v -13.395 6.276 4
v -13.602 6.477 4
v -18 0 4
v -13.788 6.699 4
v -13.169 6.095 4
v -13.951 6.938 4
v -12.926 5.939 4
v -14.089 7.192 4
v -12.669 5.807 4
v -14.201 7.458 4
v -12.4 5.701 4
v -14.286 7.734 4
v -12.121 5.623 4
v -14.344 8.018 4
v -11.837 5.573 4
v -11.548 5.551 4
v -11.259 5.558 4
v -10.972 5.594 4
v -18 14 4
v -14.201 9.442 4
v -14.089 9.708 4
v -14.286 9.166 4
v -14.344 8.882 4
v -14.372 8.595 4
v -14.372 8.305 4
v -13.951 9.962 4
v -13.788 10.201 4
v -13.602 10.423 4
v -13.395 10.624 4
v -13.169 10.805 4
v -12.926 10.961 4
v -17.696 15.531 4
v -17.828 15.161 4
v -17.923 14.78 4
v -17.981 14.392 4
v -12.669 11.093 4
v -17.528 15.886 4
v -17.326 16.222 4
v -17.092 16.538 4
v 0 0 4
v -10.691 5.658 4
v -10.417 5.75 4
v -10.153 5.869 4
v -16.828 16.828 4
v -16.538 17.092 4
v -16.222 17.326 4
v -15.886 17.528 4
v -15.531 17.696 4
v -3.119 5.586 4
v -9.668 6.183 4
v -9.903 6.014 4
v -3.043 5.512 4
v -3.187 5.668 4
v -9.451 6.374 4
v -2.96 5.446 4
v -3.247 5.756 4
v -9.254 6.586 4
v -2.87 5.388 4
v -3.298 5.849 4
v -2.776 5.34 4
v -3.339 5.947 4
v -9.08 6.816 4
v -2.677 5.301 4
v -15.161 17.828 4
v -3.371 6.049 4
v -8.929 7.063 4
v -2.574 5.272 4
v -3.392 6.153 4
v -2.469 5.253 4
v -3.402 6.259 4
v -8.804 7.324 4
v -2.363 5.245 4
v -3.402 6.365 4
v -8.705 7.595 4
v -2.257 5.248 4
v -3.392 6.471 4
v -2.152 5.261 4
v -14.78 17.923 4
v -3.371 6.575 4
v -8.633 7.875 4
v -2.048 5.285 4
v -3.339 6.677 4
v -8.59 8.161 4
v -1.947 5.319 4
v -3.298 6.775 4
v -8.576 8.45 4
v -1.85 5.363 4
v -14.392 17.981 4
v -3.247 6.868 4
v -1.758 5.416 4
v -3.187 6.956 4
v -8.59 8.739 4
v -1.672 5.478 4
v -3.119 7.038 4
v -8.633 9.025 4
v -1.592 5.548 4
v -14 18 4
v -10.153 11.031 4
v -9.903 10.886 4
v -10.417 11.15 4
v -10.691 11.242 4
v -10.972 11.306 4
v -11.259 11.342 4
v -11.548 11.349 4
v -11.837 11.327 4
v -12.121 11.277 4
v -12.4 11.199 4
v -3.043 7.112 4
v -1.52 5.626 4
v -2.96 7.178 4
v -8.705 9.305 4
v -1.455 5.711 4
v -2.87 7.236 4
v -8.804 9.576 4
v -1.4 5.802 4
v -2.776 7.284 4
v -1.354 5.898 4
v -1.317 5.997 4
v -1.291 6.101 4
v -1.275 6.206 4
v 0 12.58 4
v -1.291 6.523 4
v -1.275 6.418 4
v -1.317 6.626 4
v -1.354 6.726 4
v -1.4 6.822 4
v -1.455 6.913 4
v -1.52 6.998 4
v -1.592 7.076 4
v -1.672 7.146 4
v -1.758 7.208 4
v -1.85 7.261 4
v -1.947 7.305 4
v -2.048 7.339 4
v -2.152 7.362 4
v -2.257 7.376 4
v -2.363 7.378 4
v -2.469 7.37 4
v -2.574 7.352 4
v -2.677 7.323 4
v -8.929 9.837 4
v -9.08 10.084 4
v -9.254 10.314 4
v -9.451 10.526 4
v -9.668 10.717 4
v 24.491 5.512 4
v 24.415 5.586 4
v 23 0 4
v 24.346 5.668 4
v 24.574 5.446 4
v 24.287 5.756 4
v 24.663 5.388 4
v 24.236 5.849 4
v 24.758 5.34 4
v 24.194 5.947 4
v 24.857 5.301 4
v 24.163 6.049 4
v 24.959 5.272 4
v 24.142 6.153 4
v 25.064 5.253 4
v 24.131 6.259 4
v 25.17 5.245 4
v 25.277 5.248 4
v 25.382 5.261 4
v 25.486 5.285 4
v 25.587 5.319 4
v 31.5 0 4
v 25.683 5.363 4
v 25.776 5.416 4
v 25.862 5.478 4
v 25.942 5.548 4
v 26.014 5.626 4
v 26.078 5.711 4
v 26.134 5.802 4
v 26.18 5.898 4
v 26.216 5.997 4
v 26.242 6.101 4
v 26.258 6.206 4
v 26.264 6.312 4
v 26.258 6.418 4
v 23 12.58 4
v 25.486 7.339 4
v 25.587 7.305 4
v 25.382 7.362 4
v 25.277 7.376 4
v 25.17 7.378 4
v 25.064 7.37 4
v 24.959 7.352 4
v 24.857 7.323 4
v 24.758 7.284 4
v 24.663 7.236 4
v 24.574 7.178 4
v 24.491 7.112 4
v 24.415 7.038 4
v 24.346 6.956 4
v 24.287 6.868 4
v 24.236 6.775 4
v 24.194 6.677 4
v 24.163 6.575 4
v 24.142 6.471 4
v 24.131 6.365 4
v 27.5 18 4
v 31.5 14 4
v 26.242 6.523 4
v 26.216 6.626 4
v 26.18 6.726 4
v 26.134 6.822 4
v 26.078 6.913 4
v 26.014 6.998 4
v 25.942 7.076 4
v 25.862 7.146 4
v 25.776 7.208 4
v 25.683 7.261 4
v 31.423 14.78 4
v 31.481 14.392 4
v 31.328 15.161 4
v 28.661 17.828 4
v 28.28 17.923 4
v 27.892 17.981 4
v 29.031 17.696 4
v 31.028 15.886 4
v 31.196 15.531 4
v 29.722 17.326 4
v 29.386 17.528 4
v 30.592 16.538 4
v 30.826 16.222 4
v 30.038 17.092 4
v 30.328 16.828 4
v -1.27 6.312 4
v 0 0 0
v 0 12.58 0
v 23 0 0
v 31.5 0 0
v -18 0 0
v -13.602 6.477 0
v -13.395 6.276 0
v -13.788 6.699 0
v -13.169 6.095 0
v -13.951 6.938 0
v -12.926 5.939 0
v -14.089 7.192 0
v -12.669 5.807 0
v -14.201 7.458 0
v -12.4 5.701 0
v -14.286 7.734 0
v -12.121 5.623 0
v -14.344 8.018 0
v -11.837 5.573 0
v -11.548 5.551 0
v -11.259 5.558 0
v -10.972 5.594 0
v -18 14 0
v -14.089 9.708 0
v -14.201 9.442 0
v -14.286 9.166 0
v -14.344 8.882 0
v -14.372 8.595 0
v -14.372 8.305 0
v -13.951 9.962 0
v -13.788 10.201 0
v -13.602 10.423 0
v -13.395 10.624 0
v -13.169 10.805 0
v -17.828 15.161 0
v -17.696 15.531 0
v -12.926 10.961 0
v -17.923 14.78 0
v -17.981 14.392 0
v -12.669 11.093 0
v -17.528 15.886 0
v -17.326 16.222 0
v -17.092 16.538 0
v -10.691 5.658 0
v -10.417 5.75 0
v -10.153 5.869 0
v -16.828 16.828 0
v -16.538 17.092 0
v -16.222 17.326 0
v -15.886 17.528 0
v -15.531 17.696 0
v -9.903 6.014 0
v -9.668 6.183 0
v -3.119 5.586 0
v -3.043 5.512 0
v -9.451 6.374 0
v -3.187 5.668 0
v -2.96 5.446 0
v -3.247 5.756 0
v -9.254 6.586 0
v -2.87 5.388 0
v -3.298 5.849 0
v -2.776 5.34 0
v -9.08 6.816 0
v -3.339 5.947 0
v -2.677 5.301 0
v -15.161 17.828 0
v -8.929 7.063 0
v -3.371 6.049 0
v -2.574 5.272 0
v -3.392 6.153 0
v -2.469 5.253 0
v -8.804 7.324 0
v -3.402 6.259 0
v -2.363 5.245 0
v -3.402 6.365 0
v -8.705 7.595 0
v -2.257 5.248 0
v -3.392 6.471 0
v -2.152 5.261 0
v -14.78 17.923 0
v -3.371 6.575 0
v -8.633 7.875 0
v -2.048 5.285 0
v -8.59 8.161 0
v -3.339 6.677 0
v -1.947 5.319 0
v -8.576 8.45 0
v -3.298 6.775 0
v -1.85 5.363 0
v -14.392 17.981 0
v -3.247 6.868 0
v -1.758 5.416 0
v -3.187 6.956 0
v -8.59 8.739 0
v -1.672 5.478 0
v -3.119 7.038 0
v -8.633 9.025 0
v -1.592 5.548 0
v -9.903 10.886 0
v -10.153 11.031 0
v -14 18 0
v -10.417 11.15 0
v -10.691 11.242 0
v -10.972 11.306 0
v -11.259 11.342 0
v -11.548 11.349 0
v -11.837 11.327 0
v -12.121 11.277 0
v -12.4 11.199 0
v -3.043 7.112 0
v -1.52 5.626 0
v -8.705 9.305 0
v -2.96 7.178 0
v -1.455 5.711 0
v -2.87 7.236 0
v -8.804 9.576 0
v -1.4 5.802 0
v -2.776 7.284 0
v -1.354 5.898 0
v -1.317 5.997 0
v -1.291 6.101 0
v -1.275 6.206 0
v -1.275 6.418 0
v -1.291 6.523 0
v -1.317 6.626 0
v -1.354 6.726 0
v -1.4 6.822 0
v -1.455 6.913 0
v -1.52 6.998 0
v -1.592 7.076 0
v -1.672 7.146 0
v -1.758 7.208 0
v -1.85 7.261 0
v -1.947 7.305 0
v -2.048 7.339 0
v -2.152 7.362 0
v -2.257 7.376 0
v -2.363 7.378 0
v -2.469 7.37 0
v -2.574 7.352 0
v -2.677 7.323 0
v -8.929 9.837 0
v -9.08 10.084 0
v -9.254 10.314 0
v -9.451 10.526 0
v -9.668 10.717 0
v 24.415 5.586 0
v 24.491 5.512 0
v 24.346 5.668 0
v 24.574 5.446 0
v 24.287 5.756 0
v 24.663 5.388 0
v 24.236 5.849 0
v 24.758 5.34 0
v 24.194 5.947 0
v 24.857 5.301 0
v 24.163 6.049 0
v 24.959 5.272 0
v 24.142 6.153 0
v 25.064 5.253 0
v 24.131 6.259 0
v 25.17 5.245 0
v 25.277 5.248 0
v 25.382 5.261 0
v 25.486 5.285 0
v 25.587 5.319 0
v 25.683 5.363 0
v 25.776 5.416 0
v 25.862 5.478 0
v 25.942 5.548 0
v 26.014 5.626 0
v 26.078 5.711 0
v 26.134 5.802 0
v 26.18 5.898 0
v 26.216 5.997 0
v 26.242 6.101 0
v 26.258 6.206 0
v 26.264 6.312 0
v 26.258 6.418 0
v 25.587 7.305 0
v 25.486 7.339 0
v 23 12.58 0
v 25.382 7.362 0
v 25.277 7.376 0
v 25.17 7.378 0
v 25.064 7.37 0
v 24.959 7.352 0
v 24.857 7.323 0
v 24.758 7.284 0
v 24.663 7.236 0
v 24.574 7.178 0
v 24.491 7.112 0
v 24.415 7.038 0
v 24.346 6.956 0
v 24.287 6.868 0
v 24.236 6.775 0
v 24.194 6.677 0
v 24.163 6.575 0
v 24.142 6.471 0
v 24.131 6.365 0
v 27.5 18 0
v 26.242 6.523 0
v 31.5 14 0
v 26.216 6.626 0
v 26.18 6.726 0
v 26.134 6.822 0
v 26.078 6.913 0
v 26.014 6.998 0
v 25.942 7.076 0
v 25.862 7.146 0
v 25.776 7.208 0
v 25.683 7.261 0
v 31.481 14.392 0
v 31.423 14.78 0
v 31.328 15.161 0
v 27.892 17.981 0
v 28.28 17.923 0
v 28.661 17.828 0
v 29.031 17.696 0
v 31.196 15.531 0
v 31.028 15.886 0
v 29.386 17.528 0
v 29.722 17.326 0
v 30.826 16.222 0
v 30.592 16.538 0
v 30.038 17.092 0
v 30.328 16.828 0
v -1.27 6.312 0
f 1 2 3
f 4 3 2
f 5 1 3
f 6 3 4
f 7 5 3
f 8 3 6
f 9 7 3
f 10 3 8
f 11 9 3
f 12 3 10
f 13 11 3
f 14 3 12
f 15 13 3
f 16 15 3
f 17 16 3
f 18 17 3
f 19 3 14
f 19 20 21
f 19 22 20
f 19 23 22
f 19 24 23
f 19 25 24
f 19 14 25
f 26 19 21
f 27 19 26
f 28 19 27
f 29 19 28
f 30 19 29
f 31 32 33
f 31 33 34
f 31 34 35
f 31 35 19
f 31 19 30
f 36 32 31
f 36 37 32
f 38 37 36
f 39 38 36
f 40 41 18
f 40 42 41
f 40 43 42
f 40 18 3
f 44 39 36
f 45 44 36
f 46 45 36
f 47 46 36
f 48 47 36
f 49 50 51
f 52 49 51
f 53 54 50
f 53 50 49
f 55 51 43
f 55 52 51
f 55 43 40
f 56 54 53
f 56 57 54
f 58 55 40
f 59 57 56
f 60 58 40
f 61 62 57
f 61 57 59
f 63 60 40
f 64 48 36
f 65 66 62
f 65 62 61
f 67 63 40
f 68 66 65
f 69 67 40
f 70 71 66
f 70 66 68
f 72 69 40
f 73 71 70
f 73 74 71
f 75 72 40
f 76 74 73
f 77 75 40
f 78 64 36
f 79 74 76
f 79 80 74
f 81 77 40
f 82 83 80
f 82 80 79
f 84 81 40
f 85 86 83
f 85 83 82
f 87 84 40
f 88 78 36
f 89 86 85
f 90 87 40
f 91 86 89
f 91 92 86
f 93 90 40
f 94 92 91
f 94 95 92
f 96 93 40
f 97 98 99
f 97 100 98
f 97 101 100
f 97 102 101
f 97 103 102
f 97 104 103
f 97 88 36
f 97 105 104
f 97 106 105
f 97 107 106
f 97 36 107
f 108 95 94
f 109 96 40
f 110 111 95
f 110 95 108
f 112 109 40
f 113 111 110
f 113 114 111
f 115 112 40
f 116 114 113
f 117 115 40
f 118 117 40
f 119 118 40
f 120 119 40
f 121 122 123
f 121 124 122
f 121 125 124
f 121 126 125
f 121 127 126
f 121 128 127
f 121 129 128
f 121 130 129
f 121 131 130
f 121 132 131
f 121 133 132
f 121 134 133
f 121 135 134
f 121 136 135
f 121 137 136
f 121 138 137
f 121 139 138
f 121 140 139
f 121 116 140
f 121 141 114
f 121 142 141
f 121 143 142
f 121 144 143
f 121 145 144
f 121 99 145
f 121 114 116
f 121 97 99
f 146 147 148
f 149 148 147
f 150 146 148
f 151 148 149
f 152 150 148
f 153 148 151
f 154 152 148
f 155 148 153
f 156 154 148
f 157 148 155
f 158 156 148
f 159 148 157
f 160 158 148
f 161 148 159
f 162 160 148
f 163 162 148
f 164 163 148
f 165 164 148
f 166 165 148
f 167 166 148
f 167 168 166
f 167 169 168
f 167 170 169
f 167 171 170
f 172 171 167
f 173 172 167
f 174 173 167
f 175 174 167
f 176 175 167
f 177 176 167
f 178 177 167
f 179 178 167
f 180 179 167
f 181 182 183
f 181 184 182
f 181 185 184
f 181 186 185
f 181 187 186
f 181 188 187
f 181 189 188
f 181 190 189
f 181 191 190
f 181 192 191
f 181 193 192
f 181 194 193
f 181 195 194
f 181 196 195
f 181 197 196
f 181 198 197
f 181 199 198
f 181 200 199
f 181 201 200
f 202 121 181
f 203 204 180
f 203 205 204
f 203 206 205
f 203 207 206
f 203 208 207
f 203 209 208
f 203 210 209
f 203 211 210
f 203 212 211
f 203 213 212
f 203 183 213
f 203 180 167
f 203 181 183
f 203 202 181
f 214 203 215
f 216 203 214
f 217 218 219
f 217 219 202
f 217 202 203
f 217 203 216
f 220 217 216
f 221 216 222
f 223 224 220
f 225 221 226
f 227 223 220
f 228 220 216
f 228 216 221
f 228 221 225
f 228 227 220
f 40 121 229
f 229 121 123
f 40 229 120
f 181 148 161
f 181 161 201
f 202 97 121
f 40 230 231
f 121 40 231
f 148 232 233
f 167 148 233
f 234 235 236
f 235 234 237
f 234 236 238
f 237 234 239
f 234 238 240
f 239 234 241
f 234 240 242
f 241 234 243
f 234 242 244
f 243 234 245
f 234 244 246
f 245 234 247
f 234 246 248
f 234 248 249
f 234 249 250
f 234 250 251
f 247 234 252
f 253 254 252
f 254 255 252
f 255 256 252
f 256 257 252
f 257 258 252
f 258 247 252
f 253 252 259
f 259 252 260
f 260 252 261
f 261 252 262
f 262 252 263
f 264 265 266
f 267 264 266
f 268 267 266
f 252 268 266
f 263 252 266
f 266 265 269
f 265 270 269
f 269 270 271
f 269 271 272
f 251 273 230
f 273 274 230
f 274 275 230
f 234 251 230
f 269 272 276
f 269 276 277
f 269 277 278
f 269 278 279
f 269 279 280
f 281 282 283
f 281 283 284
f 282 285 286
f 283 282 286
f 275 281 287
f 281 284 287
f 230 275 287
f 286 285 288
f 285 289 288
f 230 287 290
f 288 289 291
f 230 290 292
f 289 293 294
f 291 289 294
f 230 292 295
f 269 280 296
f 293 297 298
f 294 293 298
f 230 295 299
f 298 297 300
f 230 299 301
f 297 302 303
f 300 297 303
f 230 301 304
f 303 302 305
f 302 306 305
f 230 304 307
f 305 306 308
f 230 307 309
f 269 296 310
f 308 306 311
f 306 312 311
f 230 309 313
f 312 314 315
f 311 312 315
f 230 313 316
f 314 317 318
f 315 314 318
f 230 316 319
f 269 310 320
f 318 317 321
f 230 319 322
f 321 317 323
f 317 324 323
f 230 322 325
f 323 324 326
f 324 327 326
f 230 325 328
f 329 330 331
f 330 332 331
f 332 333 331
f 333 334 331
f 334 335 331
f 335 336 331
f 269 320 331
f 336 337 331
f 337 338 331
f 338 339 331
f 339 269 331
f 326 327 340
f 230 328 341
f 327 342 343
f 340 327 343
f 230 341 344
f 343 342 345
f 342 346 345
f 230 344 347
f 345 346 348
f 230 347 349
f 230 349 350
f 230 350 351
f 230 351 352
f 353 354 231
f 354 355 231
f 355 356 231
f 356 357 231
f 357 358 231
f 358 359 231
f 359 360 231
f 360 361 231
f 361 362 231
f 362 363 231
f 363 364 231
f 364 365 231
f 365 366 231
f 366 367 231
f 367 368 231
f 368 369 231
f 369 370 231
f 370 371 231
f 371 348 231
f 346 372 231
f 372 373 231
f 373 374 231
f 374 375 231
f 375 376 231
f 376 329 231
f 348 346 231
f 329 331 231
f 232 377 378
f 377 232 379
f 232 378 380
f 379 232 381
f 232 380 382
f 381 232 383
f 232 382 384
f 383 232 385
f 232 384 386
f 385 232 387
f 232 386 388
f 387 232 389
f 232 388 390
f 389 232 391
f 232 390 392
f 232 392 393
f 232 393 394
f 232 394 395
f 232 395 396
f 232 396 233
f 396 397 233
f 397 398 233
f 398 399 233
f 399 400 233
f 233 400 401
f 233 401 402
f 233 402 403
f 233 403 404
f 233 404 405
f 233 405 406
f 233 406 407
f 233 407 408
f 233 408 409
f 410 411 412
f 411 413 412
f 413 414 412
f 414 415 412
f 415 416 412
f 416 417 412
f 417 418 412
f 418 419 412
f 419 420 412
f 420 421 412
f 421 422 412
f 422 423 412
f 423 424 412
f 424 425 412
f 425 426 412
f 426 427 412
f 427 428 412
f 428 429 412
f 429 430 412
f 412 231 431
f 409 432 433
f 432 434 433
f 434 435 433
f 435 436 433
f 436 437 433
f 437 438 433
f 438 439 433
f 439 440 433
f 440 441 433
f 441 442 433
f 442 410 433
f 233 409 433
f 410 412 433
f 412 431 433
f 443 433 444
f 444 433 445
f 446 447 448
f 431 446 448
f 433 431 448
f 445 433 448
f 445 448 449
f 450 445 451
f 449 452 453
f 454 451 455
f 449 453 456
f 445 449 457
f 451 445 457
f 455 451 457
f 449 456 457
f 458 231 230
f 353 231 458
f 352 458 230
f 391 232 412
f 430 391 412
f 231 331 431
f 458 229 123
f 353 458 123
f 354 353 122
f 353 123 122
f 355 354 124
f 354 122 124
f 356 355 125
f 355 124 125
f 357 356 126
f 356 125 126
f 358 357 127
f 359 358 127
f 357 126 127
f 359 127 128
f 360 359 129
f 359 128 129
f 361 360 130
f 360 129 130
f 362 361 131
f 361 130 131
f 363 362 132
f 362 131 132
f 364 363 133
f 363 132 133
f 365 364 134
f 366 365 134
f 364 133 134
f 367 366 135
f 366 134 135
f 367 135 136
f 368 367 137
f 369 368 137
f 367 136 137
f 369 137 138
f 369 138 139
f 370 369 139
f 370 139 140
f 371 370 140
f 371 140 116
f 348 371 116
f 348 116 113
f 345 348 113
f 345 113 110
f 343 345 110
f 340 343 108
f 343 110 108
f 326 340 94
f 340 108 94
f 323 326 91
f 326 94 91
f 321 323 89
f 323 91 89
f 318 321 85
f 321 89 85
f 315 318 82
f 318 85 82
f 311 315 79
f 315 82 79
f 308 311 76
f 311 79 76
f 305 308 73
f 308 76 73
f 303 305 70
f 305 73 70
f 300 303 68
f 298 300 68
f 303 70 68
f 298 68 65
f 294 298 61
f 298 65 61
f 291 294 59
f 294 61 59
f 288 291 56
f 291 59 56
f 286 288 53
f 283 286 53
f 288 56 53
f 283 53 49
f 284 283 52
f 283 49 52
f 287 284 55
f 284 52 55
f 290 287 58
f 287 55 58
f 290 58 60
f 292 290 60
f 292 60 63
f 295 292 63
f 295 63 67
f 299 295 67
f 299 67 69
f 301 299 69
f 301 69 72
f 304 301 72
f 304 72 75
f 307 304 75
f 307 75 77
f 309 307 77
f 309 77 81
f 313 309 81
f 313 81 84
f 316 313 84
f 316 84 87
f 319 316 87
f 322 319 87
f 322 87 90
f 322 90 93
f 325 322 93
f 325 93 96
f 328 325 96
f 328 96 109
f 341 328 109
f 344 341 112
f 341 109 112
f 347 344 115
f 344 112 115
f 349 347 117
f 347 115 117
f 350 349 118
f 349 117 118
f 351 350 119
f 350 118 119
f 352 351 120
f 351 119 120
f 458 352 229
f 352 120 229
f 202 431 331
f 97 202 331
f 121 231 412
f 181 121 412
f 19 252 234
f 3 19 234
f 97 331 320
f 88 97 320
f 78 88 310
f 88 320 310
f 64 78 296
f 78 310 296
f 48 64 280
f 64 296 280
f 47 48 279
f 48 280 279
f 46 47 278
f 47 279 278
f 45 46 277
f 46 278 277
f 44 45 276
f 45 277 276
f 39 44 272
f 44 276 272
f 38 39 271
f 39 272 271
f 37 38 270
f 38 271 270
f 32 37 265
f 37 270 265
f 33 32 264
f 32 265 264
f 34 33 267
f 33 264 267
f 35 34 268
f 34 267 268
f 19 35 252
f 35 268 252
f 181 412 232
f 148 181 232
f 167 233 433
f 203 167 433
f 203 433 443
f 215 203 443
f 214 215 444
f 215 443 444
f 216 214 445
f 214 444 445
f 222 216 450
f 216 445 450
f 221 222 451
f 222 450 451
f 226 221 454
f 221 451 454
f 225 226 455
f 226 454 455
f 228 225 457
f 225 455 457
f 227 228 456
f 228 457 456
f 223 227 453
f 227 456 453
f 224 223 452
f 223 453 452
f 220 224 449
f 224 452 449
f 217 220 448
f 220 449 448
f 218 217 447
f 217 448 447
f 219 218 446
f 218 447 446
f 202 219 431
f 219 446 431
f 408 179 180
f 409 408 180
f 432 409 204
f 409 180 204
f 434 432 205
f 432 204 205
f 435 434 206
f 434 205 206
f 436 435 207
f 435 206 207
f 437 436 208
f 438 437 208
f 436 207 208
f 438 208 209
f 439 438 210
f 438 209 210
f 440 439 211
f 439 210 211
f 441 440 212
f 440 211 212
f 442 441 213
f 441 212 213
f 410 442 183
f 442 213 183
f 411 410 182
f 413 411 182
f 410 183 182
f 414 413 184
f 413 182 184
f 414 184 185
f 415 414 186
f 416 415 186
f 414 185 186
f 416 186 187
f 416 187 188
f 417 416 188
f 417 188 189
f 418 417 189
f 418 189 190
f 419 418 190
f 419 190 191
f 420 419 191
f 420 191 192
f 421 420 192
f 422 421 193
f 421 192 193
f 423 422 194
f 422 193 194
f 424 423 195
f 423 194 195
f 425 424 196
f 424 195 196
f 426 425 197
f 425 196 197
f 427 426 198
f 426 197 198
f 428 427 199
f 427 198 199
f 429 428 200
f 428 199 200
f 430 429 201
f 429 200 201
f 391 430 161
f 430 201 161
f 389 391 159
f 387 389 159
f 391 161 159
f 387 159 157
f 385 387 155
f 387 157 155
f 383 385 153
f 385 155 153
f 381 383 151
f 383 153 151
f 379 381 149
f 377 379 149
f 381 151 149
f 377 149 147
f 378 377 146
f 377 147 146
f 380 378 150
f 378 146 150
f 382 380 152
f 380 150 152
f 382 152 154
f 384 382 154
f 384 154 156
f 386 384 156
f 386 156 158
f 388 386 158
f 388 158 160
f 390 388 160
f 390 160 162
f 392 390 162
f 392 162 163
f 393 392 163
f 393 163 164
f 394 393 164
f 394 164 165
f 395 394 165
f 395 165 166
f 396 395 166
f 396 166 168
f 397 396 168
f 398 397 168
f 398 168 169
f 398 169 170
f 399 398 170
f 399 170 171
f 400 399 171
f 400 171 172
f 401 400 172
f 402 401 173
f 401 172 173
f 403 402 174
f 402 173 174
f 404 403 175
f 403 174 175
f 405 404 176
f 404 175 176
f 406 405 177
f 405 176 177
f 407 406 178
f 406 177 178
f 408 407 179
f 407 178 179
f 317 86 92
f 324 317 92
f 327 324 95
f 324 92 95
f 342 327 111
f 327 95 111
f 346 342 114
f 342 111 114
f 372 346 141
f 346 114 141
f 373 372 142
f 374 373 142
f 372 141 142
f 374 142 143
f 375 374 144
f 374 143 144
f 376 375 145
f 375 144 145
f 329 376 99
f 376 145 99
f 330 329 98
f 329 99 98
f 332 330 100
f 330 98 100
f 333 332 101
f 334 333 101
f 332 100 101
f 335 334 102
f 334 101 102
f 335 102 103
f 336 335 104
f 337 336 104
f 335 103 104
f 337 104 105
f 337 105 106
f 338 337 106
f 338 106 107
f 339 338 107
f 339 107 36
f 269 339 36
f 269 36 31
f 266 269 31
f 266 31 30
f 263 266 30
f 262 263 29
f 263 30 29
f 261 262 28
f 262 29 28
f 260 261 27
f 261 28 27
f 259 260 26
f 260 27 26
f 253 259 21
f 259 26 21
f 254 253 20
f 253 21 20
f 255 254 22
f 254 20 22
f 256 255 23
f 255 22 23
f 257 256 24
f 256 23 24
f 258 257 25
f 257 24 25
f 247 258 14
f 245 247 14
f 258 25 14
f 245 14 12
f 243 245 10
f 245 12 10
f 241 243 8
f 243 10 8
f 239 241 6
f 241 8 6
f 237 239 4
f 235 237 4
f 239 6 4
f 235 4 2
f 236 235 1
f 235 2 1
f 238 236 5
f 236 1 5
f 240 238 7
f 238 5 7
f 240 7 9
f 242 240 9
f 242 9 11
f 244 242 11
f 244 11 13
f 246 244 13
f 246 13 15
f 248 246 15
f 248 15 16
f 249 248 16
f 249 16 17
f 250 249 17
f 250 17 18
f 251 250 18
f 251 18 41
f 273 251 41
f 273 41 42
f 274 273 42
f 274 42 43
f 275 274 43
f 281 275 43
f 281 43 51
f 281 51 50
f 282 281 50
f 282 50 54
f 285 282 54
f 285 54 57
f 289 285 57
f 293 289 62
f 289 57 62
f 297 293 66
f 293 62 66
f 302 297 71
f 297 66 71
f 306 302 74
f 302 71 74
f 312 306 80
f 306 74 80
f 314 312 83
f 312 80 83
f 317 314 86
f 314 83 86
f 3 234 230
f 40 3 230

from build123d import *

# Parameters (mm, degrees)
BOSS_EXTRUDE1_DEPTH = 4
SKETCH2_R           = 1.0668
SKETCH2_R_2         = 2.9
CUT_EXTRUDE1_DEPTH  = 4


with BuildPart() as part:
    # Sketch1 → Boss-Extrude1 (new body)
    with BuildSketch(Plane.XY):
        with BuildLine():
            Line((-18, 0), (0, 0))
            Line((0, 0), (0, 12.58))
            Line((0, 12.58), (23, 12.58))
            Line((23, 12.58), (23, 0))
            Line((23, 0), (31.5, 0))
            Line((31.5, 0), (31.5, 14))
            ThreePointArc((31.5, 14), (30.328427125, 16.828427125), (27.5, 18))
            Line((27.5, 18), (-14, 18))
            ThreePointArc((-14, 18), (-16.828427125, 16.828427125), (-18, 14))
            Line((-18, 14), (-18, 0))
        make_face()
    extrude(amount=BOSS_EXTRUDE1_DEPTH)

    # Sketch2 → Cut-Extrude1 (cut)
    with BuildSketch(Plane.XY.offset(4)):
        with Locations((25.1968, 6.3119)):
            Circle(SKETCH2_R)
        with Locations((-2.3368, 6.3119)):
            Circle(SKETCH2_R)
        with Locations((-11.476, 8.45)):
            Circle(SKETCH2_R_2)
    extrude(amount=-CUT_EXTRUDE1_DEPTH, mode=Mode.SUBTRACT)


solid = part.part
